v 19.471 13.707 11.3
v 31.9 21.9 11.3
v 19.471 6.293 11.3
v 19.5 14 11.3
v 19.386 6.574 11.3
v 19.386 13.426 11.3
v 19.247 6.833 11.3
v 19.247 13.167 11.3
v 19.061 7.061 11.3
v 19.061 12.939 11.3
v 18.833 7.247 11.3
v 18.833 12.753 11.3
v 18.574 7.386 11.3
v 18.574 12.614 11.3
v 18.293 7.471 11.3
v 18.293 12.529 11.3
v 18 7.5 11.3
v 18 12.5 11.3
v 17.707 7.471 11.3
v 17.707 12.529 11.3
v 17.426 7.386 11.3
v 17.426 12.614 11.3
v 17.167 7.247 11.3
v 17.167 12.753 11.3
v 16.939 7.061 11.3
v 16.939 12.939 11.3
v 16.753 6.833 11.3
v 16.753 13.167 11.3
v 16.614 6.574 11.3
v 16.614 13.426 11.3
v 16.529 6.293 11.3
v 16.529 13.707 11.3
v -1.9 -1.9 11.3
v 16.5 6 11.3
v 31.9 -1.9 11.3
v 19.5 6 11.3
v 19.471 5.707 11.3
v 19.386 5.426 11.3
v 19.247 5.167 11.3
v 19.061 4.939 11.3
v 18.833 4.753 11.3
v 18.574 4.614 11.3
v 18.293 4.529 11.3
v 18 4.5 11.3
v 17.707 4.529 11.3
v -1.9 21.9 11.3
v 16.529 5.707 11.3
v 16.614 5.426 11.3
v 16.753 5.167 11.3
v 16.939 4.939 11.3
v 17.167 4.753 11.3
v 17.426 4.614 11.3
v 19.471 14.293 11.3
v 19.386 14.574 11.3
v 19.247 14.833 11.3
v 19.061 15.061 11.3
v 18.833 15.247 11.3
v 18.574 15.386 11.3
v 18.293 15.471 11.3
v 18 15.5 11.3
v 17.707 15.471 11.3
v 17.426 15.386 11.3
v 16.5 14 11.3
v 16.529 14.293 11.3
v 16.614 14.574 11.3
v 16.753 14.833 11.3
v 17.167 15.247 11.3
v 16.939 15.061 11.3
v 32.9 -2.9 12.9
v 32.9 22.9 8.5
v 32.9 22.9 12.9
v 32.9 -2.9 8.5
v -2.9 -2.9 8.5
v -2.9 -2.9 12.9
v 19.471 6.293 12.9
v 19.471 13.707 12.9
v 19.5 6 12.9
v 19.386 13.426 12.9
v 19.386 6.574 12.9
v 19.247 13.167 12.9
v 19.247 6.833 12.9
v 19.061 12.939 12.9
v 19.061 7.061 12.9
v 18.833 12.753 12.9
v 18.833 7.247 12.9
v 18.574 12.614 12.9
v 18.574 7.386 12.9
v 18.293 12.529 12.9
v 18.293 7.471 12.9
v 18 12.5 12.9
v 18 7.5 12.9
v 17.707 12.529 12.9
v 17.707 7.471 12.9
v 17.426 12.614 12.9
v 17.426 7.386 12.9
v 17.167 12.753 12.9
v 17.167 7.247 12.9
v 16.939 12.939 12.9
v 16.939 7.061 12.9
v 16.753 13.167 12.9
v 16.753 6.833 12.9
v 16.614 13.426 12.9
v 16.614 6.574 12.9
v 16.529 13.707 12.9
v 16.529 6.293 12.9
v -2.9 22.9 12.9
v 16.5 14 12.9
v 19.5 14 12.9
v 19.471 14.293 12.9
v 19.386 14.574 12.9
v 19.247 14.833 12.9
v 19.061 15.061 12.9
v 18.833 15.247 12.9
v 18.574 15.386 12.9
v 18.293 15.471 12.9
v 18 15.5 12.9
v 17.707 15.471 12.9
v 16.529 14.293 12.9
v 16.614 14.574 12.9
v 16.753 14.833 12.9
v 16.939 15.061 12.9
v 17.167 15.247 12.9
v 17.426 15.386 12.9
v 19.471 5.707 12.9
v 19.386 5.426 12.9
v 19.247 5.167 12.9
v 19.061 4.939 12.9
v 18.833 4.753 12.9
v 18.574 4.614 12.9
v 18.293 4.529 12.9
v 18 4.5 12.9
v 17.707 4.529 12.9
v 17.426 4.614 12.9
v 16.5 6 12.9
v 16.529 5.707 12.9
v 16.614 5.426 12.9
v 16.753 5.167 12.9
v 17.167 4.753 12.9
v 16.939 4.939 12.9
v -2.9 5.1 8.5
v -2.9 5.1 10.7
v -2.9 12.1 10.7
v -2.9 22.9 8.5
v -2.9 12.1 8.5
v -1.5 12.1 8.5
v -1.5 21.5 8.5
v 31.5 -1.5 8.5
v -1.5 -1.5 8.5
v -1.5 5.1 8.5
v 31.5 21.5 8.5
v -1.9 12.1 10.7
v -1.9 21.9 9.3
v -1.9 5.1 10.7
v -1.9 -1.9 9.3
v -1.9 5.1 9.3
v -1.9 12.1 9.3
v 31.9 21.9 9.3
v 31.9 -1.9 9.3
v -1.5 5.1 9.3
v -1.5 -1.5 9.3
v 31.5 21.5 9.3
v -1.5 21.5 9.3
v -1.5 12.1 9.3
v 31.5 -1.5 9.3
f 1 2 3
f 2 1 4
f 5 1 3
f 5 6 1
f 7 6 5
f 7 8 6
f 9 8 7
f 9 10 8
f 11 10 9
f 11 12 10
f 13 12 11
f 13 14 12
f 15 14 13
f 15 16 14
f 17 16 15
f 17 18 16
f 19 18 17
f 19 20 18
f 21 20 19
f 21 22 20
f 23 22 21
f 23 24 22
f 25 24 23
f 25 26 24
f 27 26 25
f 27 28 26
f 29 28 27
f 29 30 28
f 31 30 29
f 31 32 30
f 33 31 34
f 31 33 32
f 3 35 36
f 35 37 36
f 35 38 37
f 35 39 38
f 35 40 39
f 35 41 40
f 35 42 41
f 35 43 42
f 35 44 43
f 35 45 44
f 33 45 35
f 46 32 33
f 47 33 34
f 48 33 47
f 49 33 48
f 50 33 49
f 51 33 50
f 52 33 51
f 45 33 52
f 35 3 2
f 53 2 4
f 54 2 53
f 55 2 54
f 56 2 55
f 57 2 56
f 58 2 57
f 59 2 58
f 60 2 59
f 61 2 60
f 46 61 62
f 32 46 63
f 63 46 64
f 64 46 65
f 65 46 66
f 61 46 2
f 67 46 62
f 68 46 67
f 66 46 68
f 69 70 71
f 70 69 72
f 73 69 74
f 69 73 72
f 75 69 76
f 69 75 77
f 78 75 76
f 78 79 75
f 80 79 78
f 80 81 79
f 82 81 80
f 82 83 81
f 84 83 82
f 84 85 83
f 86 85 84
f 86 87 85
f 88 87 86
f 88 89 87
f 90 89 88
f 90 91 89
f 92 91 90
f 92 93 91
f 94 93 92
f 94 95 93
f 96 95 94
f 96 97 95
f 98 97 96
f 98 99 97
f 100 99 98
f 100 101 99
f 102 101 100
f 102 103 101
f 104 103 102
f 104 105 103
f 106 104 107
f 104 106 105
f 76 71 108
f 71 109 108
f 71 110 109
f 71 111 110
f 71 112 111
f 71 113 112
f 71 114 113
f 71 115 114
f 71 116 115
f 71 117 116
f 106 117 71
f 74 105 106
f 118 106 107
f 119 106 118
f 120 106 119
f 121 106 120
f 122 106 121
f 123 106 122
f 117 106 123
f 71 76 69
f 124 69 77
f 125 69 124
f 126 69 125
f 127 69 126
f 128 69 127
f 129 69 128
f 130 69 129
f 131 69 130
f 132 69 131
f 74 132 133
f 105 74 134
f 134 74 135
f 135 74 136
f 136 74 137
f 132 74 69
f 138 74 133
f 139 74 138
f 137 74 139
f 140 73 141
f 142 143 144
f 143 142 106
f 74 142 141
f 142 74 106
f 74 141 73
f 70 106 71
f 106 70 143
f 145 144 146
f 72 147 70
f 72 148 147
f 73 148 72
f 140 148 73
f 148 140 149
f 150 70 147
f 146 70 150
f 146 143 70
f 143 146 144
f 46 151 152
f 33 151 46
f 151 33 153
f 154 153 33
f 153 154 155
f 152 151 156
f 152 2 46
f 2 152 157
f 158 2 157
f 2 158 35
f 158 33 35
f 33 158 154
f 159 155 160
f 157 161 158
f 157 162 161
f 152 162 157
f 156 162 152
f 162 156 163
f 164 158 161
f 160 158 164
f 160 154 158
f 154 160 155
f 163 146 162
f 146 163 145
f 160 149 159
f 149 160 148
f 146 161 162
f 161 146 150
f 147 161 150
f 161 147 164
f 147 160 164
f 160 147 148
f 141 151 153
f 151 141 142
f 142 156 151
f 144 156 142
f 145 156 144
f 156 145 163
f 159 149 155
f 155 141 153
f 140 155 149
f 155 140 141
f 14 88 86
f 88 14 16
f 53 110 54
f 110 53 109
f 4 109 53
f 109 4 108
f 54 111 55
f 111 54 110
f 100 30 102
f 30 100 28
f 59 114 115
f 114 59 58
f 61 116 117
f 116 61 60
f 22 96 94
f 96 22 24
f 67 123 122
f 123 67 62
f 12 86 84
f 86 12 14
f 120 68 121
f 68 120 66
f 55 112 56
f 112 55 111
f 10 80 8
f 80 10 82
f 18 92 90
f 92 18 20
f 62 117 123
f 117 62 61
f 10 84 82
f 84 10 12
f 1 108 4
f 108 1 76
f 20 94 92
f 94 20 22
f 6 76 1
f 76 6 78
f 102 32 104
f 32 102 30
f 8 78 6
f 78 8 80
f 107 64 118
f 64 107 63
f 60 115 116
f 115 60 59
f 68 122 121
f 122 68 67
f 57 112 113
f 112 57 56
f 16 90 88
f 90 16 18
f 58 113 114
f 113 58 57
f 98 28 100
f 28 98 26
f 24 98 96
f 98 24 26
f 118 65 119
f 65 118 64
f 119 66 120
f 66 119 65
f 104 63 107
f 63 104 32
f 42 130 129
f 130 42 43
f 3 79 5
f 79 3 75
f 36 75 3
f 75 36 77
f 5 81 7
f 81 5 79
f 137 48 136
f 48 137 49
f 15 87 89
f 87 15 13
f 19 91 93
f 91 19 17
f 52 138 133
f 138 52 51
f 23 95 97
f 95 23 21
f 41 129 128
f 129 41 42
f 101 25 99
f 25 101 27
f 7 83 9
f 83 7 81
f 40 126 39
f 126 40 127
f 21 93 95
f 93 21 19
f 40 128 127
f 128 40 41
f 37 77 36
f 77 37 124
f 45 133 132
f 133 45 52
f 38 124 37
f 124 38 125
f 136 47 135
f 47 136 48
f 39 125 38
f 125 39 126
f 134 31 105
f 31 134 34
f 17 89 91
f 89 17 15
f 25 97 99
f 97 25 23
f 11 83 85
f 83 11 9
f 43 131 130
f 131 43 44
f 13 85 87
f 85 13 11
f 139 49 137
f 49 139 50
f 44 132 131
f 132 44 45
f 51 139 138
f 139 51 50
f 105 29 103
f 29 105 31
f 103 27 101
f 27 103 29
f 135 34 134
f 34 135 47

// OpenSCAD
// The lid of the housing "usbc_snap", written by enclosure-nv 0.1.0
// from the board file usbc_board.kicad_pcb.  Render with OpenSCAD.
// Parameters, in millimetres.  The same block heads every file of this housing:
// when a value is changed, change it in each file.
wall = 2.4;
floor_t = 2.4;
lid_t = 1.6;
clear = 0.5;  // the board's edge to the inside of the wall
standoff_d = 6;
screw_d = 2.5;
pilot_d = 2.1;
head_d = 5;
head_h = 1.6;
lip_h = 3;  // the height of the step the lid sits on
lid_gap = 0.2;
snap_depth = 0.4;
snap_h = 0.8;
led_d = 3;
button_d = 3;
board_t = 1.6;
standoff_h = 3;  // the space under the board
top_space = 4.3;  // the space above the board
pilot_len = 3.9;  // the depth of the screw's hole
print_flip = false;  // true lays the lid plate down

// Levels along z.
z_bb = floor_t + standoff_h;
z_bt = z_bb + board_t;
z_split = z_bt + top_space;
z_step = z_split - lip_h;
z_top = z_split + lid_t;
z_skirt = z_step + lid_gap;
a_in = wall / 2;
screw_clear = screw_d + 0.3;

module outline() {
  polygon(points = [[0, 0], [30, 0], [30, 20], [0, 20]]);
}

module lid() {
  difference() {
    union() {
      // the plate
      translate([0, 0, z_split]) linear_extrude(height = lid_t) offset(delta = clear + wall) outline();
      // the skirt that takes the place of the outer half of the wall
      translate([0, 0, z_skirt]) linear_extrude(height = z_split - z_skirt + 0.2) difference() {
        offset(delta = clear + wall) outline();
        offset(delta = clear + a_in + lid_gap) outline();
      }
      // the bead that clicks into the wall's groove
      translate([0, 0, z_skirt]) linear_extrude(height = snap_h) difference() {
        offset(delta = clear + a_in + lid_gap + 0.2) outline();
        offset(delta = clear + a_in + lid_gap - snap_depth) outline();
      }
    }
    // the openings
    translate([0, 8.6, z_bt + (-0.4)]) rotate([0, 0, 180]) translate([-1, -3.5, 0]) cube([clear + wall + 2, 7, 4.1]);
    translate([18, 14, z_split - 1]) cylinder(h = lid_t + 2, d = 3, $fn = 32);
    translate([18, 6, z_split - 1]) cylinder(h = lid_t + 2, d = 3, $fn = 32);
  }
}

if (print_flip) {
  translate([0, 20, z_top]) rotate([180, 0, 0]) lid();
} else {
  lid();
}
